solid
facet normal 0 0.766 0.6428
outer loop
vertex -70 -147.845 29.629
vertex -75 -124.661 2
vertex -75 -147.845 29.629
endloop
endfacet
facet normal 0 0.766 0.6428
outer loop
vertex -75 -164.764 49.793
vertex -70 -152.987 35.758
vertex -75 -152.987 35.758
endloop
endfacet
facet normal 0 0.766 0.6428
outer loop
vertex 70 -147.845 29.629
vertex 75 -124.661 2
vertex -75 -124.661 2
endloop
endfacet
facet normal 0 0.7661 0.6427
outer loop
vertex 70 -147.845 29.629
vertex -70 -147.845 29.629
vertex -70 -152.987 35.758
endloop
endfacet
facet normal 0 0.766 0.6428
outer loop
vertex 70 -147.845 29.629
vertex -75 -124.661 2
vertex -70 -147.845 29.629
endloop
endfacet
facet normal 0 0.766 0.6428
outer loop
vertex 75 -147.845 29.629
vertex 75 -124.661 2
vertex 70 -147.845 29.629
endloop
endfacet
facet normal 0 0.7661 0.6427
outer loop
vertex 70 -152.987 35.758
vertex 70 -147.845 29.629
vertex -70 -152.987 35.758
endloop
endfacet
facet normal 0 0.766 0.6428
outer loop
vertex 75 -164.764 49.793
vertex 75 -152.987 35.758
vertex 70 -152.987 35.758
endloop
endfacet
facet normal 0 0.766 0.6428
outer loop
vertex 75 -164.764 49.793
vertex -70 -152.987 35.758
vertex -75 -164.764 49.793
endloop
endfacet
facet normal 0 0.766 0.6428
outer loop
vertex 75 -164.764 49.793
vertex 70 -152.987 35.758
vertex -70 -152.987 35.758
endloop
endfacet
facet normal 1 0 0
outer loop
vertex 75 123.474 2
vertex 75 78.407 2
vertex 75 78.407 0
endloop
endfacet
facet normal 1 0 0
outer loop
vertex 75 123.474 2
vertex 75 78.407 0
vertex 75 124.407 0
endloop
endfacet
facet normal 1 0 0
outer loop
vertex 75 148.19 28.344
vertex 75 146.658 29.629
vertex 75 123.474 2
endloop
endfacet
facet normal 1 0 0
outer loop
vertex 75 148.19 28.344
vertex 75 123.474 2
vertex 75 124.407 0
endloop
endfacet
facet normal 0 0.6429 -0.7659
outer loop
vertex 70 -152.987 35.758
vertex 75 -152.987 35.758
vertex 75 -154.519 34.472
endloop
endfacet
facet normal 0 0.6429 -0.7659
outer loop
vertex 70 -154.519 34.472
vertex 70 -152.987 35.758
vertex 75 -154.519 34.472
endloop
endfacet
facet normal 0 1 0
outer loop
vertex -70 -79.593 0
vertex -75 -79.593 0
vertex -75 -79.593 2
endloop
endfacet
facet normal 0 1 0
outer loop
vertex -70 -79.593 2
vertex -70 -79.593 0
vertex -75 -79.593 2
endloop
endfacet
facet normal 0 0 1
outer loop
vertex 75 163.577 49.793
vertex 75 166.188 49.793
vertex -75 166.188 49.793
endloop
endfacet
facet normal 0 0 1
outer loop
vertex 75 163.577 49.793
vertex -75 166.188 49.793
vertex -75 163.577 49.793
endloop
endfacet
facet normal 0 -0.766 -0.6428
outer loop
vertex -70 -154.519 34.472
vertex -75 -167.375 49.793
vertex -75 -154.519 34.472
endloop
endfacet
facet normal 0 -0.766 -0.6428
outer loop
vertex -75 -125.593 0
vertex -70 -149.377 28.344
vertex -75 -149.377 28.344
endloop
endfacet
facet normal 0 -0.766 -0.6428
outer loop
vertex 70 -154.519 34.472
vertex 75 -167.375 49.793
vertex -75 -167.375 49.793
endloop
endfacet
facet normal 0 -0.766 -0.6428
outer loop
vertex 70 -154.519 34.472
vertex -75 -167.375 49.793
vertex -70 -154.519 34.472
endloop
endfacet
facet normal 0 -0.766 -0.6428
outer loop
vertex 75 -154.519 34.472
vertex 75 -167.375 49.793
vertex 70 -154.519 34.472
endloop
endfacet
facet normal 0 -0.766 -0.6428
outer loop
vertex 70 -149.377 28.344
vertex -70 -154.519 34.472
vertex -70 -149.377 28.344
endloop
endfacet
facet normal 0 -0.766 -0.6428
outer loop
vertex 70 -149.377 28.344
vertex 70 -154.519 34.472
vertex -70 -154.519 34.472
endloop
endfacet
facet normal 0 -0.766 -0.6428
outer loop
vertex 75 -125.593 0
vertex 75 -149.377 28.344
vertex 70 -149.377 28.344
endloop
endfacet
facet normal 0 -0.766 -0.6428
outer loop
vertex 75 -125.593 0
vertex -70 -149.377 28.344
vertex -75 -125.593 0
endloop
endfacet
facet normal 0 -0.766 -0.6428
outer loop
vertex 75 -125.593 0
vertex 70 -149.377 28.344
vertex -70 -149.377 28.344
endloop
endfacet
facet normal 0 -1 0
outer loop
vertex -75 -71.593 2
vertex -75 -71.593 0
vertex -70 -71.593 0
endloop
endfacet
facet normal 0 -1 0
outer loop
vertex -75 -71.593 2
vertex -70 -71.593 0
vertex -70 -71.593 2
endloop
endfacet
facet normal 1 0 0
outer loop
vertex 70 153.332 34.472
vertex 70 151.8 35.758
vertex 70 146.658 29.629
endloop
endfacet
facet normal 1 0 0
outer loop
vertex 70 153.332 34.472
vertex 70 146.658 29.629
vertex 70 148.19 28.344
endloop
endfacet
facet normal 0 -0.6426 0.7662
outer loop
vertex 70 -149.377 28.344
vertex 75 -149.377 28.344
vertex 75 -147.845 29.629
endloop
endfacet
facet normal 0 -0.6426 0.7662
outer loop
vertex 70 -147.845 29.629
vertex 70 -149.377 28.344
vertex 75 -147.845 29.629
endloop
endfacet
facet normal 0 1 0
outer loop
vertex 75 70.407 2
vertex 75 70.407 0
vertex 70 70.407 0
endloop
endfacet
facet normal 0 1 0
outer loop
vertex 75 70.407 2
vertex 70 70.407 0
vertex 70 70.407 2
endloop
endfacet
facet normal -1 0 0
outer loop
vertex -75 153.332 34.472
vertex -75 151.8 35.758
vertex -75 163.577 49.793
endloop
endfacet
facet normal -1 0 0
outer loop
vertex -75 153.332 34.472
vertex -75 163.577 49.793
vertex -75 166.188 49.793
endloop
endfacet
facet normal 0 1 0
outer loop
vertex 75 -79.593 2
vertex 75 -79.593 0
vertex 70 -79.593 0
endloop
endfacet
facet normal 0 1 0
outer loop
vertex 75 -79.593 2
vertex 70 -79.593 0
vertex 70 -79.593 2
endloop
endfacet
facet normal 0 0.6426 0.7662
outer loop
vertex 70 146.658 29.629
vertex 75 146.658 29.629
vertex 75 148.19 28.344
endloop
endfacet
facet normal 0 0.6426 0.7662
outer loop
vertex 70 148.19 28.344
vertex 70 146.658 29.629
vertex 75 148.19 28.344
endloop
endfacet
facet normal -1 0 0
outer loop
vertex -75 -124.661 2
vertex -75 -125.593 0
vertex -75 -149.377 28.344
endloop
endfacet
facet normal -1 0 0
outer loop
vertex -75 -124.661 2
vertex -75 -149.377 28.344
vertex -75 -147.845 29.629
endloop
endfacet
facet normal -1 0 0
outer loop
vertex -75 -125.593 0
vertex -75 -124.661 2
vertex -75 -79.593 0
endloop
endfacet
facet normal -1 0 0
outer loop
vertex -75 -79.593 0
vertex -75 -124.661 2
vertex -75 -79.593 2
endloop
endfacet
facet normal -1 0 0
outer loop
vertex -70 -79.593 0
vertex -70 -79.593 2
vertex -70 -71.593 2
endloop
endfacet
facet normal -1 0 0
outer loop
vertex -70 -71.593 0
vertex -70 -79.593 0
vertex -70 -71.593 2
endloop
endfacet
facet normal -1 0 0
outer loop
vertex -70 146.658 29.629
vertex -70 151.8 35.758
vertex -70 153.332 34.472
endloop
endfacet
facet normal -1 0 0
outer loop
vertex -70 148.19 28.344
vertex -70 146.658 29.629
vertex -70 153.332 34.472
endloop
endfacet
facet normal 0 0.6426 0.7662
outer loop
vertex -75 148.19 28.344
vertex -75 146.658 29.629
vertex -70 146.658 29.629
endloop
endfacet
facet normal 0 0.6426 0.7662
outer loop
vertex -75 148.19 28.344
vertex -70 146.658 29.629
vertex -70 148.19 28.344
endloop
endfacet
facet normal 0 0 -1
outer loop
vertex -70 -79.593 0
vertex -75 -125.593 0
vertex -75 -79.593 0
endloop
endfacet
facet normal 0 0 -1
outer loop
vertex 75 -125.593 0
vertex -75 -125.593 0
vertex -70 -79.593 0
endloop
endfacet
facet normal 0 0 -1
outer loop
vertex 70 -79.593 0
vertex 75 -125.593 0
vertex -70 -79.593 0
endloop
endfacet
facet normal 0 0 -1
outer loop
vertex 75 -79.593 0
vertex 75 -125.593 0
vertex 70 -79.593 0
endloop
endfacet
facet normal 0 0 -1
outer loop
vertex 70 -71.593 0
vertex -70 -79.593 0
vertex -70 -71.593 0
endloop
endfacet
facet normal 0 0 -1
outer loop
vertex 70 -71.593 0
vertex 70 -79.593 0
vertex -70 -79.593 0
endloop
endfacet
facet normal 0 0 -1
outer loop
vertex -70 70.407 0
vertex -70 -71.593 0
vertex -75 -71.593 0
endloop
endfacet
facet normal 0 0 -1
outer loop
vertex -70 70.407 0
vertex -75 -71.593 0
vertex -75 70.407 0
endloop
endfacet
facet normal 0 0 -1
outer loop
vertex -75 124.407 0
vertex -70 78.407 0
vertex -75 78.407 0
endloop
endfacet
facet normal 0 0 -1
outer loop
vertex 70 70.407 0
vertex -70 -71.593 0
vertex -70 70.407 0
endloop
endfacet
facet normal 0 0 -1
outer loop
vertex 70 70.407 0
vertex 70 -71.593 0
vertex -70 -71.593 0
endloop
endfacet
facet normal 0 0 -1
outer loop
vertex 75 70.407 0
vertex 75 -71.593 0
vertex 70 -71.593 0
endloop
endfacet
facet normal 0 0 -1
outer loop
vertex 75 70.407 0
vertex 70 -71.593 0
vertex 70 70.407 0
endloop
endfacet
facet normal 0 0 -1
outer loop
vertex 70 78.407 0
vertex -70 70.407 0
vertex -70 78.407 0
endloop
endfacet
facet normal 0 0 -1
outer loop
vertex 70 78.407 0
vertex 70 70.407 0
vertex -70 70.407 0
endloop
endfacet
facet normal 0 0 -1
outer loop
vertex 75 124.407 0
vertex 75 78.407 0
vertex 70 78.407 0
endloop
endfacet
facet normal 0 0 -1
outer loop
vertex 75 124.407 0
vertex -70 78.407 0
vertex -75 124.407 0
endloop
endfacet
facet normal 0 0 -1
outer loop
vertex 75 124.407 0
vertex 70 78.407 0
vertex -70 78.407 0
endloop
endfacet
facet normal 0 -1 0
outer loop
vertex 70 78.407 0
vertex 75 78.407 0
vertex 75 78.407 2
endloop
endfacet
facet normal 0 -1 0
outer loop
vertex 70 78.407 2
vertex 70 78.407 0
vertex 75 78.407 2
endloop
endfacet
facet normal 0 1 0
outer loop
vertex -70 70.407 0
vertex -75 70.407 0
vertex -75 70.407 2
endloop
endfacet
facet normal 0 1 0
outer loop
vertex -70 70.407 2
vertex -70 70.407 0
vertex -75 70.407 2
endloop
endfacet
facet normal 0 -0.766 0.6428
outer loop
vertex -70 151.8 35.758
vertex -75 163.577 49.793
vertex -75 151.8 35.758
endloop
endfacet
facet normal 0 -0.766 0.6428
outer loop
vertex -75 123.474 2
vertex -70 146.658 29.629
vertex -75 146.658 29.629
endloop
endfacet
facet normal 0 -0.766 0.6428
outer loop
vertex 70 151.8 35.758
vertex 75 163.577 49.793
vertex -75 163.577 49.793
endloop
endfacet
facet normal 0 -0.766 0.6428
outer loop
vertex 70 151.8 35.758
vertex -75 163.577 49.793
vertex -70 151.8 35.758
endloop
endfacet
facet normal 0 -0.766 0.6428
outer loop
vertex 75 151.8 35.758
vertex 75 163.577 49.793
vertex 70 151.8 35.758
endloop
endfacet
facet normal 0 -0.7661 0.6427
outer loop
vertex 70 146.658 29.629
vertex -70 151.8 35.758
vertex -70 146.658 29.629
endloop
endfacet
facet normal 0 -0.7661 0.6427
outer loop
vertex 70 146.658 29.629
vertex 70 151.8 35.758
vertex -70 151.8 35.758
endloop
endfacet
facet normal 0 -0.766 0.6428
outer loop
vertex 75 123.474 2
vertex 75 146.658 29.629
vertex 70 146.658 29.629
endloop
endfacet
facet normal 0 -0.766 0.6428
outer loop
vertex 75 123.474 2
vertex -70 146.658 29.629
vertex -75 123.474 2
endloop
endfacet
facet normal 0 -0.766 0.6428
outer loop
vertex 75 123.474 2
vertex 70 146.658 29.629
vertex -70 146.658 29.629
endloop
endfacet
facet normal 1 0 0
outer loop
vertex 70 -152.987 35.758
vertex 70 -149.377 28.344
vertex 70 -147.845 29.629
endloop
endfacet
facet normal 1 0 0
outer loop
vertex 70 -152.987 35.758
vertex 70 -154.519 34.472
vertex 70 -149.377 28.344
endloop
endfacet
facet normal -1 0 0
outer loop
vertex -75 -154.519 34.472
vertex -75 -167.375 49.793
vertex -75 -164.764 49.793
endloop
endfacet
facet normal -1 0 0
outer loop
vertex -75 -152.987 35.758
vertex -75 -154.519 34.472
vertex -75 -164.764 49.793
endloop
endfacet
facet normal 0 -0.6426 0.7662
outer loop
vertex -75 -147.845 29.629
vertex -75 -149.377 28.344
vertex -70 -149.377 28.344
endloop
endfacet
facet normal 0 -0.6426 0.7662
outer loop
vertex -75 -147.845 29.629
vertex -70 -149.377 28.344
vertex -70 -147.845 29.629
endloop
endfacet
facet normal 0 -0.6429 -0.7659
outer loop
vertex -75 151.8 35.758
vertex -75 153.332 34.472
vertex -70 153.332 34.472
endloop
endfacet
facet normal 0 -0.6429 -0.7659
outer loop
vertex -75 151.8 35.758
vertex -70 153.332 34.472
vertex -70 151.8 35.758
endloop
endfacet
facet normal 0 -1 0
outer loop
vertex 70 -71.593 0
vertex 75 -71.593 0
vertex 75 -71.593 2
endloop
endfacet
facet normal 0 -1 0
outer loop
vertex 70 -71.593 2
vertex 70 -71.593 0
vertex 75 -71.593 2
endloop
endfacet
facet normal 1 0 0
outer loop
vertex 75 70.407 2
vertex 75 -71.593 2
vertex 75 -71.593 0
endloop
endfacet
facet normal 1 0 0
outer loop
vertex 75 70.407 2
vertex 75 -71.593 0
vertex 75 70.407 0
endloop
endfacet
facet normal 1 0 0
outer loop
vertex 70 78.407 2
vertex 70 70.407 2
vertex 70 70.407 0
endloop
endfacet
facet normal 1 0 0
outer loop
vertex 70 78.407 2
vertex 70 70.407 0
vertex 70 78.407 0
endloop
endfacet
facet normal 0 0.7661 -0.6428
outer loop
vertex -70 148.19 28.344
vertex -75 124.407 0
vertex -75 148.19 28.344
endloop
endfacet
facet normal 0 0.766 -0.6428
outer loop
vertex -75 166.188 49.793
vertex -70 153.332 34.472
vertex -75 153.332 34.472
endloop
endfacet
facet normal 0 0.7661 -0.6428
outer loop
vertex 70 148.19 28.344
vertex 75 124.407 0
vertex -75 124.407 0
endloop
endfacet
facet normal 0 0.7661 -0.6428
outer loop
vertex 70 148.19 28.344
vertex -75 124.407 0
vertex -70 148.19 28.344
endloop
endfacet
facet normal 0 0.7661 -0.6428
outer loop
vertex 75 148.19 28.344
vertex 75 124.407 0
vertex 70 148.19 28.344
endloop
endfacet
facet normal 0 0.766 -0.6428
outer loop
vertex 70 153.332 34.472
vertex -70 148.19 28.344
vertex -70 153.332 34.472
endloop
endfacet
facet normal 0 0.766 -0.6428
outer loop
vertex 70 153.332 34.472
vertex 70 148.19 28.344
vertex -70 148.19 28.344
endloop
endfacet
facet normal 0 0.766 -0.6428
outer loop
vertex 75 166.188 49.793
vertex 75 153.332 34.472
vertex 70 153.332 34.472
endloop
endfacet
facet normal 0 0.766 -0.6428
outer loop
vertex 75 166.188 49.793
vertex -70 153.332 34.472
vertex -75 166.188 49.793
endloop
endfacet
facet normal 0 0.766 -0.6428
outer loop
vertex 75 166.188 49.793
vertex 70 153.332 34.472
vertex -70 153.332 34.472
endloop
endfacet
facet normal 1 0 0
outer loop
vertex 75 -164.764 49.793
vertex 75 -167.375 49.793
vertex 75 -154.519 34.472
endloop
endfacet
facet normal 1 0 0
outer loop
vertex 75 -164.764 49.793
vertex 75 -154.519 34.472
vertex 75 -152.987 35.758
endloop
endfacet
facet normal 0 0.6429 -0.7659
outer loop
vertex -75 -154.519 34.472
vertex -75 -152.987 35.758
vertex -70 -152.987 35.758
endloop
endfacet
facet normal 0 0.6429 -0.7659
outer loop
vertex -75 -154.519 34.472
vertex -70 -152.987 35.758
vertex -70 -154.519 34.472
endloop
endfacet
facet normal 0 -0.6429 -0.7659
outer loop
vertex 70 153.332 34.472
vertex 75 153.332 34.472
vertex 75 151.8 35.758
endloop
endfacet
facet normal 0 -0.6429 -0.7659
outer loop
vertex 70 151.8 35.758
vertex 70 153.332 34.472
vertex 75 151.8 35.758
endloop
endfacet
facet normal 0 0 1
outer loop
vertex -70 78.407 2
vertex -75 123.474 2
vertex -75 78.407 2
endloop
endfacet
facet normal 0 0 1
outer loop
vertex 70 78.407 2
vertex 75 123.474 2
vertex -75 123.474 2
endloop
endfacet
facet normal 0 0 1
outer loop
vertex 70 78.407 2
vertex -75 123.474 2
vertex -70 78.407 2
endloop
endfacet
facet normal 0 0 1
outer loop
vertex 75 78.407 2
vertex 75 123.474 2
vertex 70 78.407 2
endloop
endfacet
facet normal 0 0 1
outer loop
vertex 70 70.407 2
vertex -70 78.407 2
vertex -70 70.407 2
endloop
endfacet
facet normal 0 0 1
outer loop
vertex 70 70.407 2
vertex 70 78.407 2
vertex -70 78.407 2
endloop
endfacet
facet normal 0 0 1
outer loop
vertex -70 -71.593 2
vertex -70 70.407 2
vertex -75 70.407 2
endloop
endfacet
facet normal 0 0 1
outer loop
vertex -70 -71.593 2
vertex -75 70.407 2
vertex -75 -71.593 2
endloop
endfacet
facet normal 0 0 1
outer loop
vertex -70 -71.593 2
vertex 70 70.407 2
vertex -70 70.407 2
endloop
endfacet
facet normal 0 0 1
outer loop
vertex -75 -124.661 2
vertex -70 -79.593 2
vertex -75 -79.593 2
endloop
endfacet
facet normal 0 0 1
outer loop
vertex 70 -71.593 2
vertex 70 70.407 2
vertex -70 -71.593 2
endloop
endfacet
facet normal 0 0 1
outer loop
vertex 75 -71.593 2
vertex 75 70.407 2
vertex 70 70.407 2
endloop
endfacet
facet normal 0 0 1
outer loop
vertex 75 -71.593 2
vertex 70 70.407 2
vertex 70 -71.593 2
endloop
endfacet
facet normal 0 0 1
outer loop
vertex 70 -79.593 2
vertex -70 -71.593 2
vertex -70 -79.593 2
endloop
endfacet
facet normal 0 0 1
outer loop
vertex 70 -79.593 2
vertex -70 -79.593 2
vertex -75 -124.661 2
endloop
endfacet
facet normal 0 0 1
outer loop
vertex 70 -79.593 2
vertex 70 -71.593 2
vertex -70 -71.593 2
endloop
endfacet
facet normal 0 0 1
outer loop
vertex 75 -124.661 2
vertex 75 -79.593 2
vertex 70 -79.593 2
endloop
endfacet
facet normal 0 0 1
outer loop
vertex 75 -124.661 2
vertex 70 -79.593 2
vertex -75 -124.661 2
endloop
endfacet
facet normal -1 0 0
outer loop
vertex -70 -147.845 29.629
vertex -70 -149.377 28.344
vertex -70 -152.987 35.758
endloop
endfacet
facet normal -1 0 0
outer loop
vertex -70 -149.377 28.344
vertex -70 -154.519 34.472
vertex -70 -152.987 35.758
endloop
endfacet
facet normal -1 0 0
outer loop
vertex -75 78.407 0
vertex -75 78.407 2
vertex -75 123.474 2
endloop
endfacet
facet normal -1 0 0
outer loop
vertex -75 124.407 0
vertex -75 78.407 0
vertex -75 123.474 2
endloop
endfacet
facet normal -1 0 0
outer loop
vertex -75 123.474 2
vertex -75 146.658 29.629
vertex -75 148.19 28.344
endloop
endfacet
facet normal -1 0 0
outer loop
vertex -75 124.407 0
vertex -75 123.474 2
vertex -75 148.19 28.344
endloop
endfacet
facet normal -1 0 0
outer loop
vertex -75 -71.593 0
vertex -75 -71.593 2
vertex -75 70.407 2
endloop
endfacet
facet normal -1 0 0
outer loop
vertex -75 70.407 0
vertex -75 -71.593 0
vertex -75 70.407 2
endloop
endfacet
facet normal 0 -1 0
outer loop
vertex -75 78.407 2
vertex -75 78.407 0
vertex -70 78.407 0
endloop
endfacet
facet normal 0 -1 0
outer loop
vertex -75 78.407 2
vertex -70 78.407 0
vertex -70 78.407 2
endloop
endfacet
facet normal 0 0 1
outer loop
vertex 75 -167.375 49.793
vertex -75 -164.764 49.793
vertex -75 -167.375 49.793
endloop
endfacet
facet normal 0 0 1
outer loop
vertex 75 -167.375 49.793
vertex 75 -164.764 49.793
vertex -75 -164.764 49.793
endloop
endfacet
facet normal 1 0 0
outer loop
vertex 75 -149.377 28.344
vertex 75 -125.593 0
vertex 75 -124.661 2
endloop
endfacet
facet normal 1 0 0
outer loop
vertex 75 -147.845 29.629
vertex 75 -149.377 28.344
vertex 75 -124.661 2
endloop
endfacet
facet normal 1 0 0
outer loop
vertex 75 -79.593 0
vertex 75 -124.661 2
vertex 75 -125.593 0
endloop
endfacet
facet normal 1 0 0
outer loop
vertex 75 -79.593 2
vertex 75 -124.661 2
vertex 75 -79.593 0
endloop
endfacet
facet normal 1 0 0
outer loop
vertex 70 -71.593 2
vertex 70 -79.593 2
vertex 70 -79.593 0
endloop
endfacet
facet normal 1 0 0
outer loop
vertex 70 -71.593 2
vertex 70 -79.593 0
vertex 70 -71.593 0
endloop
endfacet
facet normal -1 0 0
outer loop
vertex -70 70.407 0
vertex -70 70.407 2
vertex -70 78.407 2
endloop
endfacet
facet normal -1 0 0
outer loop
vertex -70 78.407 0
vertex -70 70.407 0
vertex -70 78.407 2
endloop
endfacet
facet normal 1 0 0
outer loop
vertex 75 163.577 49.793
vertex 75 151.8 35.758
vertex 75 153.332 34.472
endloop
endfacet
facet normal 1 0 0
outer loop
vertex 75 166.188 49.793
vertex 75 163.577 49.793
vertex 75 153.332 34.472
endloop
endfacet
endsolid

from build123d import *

# Parameters (mm, degrees)
F1_DEPTH = 75
F2_W     = 8
F2_H     = 2
F3_DEPTH = 5


with BuildPart() as f1:
    # F0 (on Right) → F1 (new body, symmetric)
    with BuildSketch(Plane.YZ):
        Polygon((-167.3746470185, 49.7928888027), (-125.5934523889, 0), (124.4065476111, 0), (166.1877422407, 49.7928888027), (163.5769276621, 49.7928888027), (123.4739322948, 2), (-124.6608370726, 2), (-164.7638324399, 49.7928888027), align=None)
    extrude(amount=F1_DEPTH, both=True)

    # F2 (on face) → F3 (cut)
    with BuildSketch(Plane.YZ.offset(75)):
        with Locations((-75.5934523889, 1)):
            Rectangle(F2_W, F2_H)
        with Locations((74.4065476111, 1)):
            Rectangle(F2_W, F2_H)
        Polygon((151.7999011608, 35.7575751597), (146.6576002833, 29.6292196148), (148.1896891695, 28.3436443954), (153.331990047, 34.4719999404), align=None)
        Polygon((-149.3765939473, 28.3436443954), (-147.8445050611, 29.6292196148), (-152.9868059385, 35.7575751597), (-154.5188948248, 34.4719999404), align=None)
    extrude(amount=-F3_DEPTH, mode=Mode.SUBTRACT)

    # F4: F1 across plane


with BuildPart() as f1_1:
    add(f1.part)
    add(f1.part.mirror(Plane.YZ), mode=Mode.INTERSECT)


solid = f1_1.part
